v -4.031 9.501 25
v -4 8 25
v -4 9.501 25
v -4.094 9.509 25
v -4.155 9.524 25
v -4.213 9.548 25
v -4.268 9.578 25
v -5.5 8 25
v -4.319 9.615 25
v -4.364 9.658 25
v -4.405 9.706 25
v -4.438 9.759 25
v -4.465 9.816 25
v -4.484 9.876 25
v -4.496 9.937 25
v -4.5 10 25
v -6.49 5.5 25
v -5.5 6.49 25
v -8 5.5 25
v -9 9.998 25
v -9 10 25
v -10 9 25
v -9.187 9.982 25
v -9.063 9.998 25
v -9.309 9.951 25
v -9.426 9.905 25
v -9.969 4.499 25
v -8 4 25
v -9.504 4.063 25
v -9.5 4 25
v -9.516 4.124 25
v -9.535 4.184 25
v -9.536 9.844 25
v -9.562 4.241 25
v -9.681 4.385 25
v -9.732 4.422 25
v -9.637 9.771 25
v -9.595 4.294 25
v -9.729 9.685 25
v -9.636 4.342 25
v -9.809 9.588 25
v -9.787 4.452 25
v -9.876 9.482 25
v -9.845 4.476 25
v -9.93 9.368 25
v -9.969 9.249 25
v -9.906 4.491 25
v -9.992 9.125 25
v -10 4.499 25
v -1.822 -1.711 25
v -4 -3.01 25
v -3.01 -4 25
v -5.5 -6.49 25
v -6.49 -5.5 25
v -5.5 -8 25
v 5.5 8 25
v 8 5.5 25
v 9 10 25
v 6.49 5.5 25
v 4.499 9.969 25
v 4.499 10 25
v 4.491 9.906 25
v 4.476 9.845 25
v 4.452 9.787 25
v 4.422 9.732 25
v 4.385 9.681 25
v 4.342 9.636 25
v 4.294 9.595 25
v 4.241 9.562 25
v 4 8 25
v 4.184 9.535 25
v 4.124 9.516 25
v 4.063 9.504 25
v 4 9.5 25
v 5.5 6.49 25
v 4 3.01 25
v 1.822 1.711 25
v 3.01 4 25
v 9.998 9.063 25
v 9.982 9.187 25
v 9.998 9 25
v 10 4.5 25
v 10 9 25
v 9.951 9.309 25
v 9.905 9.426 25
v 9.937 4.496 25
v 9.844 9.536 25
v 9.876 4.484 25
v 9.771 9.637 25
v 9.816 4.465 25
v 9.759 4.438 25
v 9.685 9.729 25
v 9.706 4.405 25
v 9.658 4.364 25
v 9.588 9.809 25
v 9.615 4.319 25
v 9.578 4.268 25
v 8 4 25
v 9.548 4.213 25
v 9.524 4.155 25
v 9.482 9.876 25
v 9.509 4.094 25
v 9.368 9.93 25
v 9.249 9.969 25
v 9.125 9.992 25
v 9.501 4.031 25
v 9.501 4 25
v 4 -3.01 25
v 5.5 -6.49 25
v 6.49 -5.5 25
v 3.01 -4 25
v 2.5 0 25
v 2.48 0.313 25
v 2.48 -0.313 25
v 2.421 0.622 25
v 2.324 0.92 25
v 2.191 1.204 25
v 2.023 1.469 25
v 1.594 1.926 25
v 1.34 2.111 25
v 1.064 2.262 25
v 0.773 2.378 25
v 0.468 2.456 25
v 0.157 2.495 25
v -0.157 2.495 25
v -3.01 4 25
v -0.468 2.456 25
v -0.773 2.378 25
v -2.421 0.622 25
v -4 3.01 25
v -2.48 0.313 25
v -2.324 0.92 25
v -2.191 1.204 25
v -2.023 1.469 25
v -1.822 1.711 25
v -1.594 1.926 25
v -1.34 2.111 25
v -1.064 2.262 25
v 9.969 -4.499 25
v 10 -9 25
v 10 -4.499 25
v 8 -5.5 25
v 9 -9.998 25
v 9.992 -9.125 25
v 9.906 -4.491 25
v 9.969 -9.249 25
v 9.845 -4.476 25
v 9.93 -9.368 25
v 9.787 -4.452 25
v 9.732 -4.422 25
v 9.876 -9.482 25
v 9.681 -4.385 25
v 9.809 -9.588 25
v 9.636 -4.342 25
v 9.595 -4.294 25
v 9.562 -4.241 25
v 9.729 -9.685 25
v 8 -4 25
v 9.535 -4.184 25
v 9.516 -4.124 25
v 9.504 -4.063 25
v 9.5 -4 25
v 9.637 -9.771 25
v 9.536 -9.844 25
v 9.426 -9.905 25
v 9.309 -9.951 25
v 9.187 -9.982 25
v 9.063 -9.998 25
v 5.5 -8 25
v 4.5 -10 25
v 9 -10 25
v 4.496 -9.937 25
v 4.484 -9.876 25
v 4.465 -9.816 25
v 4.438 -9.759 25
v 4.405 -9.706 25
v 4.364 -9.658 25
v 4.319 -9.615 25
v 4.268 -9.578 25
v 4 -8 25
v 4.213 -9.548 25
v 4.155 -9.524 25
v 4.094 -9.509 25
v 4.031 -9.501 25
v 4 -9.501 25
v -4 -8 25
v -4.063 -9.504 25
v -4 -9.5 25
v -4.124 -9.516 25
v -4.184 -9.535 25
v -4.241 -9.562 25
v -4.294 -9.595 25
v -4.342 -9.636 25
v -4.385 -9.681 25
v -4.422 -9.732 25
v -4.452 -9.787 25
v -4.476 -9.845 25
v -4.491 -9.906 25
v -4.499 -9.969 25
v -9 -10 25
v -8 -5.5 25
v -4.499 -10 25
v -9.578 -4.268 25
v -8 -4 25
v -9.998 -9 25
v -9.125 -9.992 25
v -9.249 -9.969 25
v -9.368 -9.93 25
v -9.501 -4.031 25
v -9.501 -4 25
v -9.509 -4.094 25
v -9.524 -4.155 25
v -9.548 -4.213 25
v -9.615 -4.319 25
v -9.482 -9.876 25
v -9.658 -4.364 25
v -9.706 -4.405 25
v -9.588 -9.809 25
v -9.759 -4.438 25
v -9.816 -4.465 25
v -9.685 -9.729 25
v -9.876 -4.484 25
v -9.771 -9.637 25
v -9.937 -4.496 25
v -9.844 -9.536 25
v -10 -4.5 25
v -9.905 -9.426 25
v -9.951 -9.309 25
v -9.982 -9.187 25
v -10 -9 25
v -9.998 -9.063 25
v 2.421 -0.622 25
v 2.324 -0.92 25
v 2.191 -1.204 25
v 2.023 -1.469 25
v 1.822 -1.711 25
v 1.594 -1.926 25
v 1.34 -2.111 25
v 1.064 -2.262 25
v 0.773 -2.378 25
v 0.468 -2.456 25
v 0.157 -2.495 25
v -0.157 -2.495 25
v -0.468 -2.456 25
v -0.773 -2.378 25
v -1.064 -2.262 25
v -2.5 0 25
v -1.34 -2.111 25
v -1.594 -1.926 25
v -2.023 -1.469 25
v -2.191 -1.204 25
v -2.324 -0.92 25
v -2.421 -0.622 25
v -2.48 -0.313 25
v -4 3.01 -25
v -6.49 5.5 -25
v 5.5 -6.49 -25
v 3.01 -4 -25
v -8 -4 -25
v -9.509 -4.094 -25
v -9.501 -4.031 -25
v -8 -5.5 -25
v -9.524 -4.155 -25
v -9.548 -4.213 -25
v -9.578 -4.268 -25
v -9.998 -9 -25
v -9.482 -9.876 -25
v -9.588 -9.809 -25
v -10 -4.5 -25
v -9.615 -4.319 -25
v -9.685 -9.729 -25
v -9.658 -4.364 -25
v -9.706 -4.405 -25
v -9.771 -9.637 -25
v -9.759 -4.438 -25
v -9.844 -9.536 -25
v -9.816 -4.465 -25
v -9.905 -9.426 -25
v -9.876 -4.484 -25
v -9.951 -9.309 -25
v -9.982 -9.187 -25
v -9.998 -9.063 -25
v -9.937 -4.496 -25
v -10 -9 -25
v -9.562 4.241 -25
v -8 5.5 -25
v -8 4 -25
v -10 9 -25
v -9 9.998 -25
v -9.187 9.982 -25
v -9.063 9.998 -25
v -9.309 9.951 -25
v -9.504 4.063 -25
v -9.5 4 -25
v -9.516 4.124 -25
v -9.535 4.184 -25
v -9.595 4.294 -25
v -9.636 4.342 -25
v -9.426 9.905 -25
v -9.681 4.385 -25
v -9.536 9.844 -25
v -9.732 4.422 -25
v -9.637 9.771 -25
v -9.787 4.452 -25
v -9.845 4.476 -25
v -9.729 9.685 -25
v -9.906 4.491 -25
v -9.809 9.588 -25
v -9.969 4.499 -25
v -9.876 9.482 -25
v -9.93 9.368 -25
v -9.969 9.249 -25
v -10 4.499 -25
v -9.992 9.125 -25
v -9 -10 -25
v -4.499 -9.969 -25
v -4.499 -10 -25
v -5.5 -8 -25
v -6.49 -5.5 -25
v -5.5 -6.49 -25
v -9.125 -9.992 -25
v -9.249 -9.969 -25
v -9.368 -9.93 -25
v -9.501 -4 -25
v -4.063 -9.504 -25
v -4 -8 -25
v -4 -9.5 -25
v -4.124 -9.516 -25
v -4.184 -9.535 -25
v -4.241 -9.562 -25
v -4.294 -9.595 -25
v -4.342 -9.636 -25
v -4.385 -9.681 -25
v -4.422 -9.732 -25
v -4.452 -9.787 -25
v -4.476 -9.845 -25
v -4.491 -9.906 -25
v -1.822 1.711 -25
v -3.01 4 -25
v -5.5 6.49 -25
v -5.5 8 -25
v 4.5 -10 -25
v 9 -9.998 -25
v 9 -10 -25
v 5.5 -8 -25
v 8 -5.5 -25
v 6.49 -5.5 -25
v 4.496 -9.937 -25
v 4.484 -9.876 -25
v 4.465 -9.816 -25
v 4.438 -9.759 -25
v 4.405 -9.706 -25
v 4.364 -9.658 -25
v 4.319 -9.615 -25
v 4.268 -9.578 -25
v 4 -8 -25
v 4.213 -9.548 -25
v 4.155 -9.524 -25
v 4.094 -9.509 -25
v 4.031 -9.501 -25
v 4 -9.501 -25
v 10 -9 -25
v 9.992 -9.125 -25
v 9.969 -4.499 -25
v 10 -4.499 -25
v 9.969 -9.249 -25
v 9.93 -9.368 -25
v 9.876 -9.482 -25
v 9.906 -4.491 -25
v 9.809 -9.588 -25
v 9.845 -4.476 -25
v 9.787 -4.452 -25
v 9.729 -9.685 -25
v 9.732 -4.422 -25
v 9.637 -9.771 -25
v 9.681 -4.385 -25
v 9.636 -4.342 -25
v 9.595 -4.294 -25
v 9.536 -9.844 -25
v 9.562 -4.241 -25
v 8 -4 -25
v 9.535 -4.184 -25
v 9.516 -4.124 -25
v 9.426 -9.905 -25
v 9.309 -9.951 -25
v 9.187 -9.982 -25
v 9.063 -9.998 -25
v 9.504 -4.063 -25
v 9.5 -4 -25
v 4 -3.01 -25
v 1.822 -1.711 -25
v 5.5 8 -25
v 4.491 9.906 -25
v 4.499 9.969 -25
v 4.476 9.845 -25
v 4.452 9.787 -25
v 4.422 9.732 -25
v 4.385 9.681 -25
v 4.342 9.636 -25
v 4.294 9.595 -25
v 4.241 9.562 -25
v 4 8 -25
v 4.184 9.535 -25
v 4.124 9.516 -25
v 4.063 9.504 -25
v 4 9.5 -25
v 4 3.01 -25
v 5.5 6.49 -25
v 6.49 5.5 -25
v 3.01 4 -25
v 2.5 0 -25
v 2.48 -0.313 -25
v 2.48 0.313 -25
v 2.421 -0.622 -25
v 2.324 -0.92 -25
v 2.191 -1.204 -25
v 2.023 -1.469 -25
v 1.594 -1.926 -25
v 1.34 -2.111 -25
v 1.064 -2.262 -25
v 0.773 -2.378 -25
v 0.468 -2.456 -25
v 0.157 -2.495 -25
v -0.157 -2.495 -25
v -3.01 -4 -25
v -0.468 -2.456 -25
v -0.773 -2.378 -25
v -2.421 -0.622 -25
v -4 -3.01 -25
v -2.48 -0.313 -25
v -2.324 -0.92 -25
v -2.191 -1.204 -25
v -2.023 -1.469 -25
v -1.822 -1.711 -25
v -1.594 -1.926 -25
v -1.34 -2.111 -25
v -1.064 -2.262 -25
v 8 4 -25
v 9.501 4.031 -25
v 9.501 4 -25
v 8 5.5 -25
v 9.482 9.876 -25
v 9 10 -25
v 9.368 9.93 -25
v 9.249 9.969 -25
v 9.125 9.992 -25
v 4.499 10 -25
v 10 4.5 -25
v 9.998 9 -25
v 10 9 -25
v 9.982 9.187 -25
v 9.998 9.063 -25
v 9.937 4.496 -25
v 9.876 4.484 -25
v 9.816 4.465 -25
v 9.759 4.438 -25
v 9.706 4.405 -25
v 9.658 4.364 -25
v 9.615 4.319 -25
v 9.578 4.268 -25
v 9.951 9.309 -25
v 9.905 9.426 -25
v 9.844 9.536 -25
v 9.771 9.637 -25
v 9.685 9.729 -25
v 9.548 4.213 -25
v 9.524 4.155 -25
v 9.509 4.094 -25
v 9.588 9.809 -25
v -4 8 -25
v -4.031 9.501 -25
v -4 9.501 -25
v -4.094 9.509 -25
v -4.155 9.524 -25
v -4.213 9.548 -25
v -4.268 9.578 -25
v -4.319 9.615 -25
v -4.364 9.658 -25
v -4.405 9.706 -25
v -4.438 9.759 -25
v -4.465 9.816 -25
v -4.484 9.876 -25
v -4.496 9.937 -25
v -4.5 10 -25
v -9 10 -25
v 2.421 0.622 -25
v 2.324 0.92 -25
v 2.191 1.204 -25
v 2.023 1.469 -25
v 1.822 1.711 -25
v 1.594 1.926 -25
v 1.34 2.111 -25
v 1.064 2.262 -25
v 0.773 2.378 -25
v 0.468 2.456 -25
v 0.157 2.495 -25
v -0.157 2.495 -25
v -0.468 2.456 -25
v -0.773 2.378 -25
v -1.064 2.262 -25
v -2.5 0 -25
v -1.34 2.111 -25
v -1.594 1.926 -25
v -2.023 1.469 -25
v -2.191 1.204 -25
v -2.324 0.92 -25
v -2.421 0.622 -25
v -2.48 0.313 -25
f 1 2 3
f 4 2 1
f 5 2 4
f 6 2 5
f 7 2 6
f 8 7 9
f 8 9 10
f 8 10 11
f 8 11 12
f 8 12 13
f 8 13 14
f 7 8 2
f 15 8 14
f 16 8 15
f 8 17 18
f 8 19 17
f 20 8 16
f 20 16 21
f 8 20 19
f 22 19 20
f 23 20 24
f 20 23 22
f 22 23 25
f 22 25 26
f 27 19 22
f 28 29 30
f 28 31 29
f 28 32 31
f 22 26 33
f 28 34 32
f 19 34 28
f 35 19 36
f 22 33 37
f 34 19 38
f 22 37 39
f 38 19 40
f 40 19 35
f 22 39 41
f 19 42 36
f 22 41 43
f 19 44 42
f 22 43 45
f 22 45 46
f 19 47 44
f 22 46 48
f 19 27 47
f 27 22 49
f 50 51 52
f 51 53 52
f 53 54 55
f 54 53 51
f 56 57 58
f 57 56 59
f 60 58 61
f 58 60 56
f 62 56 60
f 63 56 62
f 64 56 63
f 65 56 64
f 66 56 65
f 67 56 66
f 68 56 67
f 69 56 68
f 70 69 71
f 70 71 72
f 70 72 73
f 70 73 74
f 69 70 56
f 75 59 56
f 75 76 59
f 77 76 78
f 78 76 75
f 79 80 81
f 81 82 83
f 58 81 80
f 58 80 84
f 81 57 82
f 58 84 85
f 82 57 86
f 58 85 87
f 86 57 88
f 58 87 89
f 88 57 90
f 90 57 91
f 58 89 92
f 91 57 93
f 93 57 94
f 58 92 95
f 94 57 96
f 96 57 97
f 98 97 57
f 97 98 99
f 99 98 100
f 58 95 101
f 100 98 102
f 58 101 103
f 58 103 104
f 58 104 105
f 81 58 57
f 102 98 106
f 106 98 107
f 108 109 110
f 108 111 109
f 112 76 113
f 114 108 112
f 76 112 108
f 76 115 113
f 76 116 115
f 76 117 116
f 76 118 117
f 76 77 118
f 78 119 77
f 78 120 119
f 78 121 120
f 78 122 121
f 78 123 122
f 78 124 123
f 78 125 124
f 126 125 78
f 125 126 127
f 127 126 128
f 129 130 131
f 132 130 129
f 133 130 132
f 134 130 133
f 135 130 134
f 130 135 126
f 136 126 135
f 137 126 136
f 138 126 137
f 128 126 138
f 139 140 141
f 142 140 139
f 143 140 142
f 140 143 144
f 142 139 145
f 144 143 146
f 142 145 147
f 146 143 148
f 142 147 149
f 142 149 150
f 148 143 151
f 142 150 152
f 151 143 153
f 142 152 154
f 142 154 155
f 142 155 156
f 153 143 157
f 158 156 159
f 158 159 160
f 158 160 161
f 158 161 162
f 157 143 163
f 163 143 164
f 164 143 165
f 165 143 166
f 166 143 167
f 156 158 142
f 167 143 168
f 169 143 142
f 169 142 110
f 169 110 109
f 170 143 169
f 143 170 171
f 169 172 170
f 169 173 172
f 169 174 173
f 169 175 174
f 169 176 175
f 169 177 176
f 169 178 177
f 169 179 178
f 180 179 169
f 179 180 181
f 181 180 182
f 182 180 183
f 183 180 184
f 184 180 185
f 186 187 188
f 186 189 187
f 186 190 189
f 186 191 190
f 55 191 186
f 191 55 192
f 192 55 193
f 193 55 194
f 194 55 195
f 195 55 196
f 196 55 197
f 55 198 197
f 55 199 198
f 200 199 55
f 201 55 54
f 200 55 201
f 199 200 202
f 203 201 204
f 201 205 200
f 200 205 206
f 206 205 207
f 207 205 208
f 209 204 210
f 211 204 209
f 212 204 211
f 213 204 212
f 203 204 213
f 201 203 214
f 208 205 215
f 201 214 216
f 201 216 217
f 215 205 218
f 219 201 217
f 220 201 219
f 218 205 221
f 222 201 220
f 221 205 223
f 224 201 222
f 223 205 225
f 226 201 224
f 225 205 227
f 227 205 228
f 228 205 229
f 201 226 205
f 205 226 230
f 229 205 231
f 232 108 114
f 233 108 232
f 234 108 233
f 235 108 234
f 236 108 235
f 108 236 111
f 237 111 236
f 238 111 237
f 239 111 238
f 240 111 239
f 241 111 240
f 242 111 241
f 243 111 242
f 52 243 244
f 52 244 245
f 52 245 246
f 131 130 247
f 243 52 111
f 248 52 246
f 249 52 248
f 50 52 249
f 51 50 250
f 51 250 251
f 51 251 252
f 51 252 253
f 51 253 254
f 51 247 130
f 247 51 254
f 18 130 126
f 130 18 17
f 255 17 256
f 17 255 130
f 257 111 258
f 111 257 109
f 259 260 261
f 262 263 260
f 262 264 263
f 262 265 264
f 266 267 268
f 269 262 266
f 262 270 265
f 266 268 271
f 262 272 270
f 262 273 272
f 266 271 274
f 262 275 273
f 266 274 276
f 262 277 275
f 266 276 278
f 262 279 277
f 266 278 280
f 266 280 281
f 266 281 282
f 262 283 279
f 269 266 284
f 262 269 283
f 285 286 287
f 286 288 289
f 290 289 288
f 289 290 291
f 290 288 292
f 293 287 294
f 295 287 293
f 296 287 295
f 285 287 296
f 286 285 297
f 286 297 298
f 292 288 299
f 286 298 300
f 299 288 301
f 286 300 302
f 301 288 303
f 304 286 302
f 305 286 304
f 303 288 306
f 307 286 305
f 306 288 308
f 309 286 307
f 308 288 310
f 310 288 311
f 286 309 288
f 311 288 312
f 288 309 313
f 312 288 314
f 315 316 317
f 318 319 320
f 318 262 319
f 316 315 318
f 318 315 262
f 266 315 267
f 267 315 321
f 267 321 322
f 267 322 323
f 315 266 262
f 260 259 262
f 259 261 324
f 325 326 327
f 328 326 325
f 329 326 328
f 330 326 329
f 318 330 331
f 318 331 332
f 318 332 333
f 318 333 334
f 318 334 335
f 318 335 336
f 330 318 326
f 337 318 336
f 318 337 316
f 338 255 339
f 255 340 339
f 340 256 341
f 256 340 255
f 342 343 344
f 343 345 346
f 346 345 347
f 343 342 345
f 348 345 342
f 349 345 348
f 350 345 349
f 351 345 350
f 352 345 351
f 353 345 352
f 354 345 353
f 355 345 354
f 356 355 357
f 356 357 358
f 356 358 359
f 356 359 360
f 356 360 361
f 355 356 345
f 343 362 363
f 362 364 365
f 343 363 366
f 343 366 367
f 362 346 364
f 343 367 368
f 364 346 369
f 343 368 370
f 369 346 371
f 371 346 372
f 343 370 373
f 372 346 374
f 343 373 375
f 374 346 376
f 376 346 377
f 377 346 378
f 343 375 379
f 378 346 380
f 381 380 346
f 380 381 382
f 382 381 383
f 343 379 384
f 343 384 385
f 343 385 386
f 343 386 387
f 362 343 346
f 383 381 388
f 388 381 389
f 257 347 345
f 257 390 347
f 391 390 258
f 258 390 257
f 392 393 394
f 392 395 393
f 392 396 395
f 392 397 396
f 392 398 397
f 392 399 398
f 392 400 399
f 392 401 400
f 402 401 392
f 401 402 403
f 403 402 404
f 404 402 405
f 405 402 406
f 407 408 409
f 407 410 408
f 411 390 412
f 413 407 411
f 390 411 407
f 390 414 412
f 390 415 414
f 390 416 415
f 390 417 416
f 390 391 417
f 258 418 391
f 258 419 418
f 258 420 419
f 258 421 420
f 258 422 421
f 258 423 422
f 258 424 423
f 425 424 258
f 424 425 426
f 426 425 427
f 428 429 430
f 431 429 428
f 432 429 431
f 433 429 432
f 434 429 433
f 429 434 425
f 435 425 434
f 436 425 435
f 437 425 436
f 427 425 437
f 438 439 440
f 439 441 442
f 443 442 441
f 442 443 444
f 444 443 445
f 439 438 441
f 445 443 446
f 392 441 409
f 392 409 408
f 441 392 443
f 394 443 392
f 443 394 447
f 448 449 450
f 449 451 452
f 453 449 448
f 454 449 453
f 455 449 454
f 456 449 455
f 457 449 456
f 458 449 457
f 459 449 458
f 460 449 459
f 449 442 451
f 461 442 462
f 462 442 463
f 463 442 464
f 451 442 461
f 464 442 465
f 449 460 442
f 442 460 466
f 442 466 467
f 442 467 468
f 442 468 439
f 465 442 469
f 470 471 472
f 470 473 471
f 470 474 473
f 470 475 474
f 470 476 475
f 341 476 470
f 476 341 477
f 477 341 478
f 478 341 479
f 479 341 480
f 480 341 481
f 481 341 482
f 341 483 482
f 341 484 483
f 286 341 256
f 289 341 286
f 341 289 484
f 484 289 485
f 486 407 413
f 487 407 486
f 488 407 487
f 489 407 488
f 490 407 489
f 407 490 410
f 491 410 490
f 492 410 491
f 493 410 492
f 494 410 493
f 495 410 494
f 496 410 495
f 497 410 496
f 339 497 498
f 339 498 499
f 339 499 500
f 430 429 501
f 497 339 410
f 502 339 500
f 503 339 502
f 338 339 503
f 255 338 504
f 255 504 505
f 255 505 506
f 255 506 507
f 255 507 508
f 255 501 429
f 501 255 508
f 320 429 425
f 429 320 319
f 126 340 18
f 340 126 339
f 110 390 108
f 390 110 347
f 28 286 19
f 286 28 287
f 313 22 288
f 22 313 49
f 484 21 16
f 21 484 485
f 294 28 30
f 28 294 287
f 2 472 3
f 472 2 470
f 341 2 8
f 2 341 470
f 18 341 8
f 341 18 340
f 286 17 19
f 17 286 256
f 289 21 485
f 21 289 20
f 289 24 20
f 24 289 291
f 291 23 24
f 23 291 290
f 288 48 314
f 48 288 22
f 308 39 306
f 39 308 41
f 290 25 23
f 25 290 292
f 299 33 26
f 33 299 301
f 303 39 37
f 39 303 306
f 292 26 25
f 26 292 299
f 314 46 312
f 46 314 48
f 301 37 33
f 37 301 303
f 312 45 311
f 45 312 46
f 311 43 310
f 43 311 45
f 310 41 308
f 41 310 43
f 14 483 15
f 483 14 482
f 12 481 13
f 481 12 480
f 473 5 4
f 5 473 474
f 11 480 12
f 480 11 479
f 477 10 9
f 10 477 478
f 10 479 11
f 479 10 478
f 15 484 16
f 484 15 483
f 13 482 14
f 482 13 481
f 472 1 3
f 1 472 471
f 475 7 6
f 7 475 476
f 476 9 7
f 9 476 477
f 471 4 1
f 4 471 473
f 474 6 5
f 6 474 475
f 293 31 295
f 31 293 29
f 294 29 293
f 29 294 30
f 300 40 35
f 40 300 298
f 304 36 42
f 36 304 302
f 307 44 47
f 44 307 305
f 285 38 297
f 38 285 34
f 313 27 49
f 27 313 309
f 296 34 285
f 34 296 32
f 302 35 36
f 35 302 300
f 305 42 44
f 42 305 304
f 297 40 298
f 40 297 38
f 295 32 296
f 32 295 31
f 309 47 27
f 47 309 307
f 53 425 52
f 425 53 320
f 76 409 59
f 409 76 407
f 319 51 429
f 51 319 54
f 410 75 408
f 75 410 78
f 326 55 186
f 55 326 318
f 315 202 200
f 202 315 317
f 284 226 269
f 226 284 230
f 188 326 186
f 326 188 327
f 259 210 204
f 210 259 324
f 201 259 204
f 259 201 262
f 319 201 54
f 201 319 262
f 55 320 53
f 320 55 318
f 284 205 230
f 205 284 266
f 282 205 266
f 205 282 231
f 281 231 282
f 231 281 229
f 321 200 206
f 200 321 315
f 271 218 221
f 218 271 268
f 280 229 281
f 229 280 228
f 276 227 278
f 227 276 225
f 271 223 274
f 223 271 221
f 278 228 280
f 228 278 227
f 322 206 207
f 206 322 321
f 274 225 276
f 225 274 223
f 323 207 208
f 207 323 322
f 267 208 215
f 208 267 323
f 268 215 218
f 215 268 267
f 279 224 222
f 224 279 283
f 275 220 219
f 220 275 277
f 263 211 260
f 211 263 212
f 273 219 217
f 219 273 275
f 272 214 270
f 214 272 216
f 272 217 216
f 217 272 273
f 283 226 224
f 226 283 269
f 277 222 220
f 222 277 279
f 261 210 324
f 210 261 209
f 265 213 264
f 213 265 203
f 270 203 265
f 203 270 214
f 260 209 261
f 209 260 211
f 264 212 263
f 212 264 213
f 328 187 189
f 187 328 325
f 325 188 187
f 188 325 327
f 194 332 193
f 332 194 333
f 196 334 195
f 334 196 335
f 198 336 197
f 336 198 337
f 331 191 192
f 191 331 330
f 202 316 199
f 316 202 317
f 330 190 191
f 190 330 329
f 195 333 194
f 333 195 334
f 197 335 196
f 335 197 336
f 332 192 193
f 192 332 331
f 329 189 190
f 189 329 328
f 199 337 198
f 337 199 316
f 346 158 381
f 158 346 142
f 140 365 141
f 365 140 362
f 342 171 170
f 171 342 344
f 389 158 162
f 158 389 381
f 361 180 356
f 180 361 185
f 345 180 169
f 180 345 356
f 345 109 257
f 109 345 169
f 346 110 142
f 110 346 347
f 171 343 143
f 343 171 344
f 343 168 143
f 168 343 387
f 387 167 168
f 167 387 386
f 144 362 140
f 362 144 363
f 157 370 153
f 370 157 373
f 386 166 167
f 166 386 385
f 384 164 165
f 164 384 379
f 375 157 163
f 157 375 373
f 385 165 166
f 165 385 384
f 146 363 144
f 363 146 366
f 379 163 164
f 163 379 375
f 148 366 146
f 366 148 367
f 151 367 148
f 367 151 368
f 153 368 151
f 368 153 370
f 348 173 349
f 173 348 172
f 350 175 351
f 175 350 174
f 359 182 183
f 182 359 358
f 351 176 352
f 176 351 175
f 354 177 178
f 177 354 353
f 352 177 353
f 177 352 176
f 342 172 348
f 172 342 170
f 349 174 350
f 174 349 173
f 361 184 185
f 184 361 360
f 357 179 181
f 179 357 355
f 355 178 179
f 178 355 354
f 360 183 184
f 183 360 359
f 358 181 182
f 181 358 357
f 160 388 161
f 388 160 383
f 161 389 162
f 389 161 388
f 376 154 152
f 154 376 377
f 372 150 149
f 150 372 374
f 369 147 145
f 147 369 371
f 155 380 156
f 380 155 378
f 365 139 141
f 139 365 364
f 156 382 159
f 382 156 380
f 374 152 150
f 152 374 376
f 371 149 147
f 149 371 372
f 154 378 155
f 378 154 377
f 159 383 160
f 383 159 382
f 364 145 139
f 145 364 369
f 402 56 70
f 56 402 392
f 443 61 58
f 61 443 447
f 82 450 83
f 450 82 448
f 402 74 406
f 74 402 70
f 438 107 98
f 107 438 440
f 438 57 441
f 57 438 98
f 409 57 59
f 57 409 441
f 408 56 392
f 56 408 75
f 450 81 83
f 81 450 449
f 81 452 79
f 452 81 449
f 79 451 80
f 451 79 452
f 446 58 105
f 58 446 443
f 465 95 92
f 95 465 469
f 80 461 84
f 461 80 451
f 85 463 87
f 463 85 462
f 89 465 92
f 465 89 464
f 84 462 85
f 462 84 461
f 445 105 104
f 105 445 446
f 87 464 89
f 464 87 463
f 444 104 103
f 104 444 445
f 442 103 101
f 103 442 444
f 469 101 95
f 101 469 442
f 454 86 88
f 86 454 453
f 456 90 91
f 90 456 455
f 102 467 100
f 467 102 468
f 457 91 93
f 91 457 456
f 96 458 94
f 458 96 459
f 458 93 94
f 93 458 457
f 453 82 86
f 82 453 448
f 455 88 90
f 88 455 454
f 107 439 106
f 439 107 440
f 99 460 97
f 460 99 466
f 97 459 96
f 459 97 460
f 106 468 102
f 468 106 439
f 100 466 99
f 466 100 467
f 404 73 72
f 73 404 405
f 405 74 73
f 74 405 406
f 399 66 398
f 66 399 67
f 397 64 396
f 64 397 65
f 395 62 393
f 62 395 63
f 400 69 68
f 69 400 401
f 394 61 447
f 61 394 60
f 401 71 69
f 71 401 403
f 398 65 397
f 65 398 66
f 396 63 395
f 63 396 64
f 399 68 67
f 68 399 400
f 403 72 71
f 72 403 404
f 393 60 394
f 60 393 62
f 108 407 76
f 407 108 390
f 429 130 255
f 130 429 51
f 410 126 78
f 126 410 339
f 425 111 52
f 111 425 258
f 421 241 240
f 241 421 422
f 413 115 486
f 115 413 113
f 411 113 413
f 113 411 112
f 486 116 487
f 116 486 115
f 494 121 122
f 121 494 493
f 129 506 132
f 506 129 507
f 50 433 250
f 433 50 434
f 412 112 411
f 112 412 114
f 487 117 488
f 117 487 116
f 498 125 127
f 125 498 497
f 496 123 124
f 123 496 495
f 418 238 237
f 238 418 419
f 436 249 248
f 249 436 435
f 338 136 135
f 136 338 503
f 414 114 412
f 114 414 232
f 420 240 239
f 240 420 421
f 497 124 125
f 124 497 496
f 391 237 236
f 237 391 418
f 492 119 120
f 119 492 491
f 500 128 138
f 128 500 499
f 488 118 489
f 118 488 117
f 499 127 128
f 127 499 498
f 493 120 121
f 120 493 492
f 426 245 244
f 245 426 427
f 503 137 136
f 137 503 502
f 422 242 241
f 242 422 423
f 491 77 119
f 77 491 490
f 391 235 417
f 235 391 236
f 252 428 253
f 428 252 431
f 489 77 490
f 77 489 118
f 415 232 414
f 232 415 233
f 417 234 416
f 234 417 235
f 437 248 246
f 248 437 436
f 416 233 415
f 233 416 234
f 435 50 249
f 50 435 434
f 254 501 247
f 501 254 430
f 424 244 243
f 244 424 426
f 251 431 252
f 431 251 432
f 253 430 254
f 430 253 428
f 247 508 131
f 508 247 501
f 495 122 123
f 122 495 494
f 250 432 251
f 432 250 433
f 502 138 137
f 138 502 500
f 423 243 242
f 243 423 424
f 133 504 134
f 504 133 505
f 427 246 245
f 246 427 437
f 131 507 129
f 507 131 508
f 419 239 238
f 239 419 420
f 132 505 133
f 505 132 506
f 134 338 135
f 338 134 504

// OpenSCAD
//Credit: https://www.thingiverse.com/thing:27825/files

$fn=50;

module makerBeam(length)
{
	difference(){
		union(){
			// body
			cube([8,8,length], center=true);
			// corners
			for (i=[0:3]){
				rotate([0, 0, i*90]){corner(length);}
			}
		}
		// center hole
		cylinder(h=length, r=2.5, center=true);
	};
}

module corner(length){
	difference(){
		union(){
			// arm
			rotate([0, 0, 45]){
				translate([0,5,0]){cube([1.4, 15, length], center=true);}
			}

			translate([-9, 7, 0]){cube([2, 6, length], center=true);}
			translate([-7, 9, 0]){cube([6, 2, length], center=true);}
			translate([-7, 7, 0]){cube([3, 3, length], center=true);}
		}

		translate([-4, 10, 0]){cylinder(h=length, r=0.5, center=true);}
		translate([-10, 4, 0]){cylinder(h=length, r=0.5, center=true);}

		// round external shape
		difference(){
			translate([-9.5, 9.5, 0]){cube([1, 1, length], center=true);}
			translate([-9, 9, 0]){cylinder(h=length, r=1, center=true);}
		}
	}
}


makerBeam(50);
